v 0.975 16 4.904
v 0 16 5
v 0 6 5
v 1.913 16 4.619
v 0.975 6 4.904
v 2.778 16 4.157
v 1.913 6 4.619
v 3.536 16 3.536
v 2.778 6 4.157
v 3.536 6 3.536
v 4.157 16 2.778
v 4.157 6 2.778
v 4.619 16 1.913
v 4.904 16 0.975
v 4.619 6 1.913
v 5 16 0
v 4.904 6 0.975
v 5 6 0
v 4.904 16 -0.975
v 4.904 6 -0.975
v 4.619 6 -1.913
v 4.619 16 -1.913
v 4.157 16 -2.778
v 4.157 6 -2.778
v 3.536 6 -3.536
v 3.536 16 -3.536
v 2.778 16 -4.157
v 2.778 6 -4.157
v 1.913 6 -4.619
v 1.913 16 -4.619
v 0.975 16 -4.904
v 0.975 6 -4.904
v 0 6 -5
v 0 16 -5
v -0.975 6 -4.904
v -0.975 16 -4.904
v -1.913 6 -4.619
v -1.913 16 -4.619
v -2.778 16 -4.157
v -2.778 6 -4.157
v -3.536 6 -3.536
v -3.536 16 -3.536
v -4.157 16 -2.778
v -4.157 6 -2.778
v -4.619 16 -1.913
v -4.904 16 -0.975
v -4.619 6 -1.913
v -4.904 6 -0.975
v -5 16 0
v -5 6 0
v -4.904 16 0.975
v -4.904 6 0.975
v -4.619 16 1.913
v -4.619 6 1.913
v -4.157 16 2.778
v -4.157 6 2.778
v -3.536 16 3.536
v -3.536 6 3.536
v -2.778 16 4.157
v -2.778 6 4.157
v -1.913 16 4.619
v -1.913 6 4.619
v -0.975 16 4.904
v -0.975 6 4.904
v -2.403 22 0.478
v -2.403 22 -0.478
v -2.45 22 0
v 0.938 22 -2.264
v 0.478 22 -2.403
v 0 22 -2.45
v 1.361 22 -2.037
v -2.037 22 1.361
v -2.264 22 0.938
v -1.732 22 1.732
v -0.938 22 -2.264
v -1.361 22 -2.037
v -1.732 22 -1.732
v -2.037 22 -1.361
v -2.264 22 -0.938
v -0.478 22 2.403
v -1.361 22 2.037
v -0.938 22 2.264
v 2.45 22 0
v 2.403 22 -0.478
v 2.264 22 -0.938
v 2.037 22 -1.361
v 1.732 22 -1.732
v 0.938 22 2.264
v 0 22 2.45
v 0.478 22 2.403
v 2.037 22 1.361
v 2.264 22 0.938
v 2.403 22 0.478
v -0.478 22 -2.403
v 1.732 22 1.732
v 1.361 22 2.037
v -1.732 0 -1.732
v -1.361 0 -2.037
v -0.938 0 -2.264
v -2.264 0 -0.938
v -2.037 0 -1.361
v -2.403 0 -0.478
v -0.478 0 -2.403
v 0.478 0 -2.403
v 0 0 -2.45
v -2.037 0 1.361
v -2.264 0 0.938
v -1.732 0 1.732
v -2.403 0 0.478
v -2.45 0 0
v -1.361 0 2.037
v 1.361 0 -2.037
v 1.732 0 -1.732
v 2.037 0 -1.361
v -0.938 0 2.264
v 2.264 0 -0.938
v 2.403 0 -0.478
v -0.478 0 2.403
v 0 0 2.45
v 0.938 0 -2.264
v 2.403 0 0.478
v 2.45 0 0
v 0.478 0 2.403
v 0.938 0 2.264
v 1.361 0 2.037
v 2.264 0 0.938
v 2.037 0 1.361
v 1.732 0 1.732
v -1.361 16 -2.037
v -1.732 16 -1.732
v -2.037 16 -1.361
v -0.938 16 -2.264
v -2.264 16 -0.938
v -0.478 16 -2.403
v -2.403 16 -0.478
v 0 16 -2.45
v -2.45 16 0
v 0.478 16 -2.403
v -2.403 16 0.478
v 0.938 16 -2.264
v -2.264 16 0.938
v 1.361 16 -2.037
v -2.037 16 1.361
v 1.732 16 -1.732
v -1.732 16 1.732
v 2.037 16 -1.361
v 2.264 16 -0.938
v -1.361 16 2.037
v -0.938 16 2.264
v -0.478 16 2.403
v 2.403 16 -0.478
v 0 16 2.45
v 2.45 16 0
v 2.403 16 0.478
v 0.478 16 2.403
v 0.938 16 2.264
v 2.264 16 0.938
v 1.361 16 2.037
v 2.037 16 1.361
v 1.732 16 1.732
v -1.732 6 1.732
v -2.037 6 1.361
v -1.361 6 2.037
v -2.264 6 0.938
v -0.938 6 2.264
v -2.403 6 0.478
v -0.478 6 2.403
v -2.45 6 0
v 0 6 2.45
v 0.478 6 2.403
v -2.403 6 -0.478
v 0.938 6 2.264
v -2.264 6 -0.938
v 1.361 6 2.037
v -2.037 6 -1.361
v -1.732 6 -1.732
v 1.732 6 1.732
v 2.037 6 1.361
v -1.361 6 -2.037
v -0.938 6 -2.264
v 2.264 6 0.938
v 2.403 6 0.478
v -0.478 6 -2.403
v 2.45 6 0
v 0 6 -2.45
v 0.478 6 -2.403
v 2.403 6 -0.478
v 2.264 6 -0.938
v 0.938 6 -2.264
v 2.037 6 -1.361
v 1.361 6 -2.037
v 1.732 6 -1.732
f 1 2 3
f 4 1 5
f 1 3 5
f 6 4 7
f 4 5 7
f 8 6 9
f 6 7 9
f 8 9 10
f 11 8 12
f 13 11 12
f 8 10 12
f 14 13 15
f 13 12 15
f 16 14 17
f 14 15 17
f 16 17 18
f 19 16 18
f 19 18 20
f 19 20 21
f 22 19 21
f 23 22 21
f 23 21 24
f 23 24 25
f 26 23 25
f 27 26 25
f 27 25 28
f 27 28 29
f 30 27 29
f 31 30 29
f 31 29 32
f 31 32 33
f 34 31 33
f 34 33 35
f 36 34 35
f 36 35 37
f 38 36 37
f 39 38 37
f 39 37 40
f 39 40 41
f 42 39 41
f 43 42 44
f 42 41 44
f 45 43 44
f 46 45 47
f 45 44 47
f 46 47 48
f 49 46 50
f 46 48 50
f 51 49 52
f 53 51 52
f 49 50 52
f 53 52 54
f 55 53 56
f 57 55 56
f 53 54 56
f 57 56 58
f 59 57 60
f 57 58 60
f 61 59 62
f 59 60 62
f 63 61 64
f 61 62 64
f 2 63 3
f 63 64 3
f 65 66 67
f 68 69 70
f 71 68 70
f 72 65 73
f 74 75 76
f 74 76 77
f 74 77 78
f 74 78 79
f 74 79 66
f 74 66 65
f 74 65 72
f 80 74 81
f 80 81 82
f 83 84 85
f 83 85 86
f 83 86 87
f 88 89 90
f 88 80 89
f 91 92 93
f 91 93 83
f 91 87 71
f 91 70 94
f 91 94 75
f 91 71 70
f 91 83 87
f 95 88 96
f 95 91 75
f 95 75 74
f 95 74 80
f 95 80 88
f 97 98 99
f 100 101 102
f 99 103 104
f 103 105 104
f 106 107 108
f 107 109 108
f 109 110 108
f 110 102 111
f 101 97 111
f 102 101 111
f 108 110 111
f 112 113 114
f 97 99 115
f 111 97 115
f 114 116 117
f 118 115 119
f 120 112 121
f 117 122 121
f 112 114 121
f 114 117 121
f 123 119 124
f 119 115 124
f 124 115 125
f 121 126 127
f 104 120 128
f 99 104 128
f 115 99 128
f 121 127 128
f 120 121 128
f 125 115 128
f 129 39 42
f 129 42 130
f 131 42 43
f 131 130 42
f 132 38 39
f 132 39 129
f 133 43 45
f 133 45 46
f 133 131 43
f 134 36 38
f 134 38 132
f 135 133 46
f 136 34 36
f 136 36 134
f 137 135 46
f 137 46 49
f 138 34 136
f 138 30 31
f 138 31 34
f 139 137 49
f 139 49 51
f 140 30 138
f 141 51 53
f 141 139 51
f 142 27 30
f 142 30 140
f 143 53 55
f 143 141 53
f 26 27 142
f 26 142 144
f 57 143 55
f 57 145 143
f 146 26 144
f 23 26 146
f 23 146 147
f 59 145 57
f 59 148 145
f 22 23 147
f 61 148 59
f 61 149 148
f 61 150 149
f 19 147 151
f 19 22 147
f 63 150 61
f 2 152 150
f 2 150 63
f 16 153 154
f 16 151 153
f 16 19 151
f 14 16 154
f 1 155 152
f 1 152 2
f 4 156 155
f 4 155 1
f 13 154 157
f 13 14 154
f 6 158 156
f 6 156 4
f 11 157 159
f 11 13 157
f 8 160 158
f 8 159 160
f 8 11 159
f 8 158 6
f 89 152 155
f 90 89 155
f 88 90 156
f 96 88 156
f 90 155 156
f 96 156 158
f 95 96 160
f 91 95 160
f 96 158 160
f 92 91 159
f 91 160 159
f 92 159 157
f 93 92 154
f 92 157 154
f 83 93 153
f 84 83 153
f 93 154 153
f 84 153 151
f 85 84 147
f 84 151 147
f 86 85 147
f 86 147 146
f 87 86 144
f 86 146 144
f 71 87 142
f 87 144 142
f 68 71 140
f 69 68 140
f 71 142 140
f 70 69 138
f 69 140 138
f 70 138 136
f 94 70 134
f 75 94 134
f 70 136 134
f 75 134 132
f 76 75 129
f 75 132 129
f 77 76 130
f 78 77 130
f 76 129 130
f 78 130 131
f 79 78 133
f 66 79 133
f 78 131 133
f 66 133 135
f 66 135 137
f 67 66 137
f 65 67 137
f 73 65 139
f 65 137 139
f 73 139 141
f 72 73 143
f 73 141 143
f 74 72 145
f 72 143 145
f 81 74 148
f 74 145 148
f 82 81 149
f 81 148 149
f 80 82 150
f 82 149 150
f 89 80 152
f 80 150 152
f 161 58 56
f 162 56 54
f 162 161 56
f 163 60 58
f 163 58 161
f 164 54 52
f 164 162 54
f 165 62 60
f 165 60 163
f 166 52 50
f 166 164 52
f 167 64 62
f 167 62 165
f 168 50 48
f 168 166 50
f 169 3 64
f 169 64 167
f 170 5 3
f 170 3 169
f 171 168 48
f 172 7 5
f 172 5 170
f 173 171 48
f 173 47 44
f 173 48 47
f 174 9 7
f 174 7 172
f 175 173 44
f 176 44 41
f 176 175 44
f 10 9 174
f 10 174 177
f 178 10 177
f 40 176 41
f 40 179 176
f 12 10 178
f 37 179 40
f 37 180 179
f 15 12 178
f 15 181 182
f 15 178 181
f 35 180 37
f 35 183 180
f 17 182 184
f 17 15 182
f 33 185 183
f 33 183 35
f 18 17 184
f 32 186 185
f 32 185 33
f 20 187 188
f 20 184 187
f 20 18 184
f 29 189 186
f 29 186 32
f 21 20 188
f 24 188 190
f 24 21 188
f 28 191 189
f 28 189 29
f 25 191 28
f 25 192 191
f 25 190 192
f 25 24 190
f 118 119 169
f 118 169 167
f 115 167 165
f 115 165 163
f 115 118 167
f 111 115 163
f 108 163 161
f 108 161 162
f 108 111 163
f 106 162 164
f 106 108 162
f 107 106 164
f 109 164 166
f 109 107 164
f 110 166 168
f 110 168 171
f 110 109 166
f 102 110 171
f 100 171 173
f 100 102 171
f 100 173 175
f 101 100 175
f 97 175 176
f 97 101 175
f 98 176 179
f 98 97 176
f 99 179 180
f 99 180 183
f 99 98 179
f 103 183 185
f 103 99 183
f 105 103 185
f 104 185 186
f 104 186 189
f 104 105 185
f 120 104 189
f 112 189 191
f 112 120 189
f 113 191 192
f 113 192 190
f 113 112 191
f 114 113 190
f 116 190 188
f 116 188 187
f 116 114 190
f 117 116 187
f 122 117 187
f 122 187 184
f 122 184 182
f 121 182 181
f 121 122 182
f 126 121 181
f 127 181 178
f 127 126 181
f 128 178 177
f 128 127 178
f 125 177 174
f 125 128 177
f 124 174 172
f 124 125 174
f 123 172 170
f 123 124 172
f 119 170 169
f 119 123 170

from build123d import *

# Parameters (mm, degrees)
SKETCH2_R           = 5
BOSS_EXTRUDE1_DEPTH = 22
CUT_EXTRUDE1_START  = -6
SKETCH3_R           = 5
SKETCH3_R_2         = 2.45
CUT_EXTRUDE1_DEPTH  = 6
SKETCH4_R           = 5
SKETCH4_R_2         = 2.45
CUT_EXTRUDE2_DEPTH  = 6


with BuildPart() as part:
    # Sketch2 → Boss-Extrude1 (new body)
    with BuildSketch(Plane(origin=(0, 0, 0), x_dir=(1, 0, 0), z_dir=(0, 1, 0))):
        with Locations(Location((0, 0, 0), (0, 0, 270))):
            Circle(SKETCH2_R)
    extrude(amount=BOSS_EXTRUDE1_DEPTH)

    # Sketch3 → Cut-Extrude1 (cut)
    with BuildSketch(Plane(origin=(0, 22, 0), x_dir=(1, 0, 0), z_dir=(0, 1, 0)).offset(CUT_EXTRUDE1_START)):
        with Locations(Location((0, 0, 0), (0, 0, 270))):
            Circle(SKETCH3_R)
        with Locations(Location((0, 0, 0), (0, 0, 270))):
            Circle(SKETCH3_R_2, mode=Mode.SUBTRACT)
    extrude(amount=CUT_EXTRUDE1_DEPTH, mode=Mode.SUBTRACT)

    # Sketch4 → Cut-Extrude2 (cut)
    with BuildSketch(Plane.XZ):
        with Locations(Location((0, 0, 0), (0, 0, 270))):
            Circle(SKETCH4_R)
        with Locations(Location((0, 0, 0), (0, 0, 90))):
            Circle(SKETCH4_R_2, mode=Mode.SUBTRACT)
    extrude(amount=-CUT_EXTRUDE2_DEPTH, mode=Mode.SUBTRACT)


solid = part.part
